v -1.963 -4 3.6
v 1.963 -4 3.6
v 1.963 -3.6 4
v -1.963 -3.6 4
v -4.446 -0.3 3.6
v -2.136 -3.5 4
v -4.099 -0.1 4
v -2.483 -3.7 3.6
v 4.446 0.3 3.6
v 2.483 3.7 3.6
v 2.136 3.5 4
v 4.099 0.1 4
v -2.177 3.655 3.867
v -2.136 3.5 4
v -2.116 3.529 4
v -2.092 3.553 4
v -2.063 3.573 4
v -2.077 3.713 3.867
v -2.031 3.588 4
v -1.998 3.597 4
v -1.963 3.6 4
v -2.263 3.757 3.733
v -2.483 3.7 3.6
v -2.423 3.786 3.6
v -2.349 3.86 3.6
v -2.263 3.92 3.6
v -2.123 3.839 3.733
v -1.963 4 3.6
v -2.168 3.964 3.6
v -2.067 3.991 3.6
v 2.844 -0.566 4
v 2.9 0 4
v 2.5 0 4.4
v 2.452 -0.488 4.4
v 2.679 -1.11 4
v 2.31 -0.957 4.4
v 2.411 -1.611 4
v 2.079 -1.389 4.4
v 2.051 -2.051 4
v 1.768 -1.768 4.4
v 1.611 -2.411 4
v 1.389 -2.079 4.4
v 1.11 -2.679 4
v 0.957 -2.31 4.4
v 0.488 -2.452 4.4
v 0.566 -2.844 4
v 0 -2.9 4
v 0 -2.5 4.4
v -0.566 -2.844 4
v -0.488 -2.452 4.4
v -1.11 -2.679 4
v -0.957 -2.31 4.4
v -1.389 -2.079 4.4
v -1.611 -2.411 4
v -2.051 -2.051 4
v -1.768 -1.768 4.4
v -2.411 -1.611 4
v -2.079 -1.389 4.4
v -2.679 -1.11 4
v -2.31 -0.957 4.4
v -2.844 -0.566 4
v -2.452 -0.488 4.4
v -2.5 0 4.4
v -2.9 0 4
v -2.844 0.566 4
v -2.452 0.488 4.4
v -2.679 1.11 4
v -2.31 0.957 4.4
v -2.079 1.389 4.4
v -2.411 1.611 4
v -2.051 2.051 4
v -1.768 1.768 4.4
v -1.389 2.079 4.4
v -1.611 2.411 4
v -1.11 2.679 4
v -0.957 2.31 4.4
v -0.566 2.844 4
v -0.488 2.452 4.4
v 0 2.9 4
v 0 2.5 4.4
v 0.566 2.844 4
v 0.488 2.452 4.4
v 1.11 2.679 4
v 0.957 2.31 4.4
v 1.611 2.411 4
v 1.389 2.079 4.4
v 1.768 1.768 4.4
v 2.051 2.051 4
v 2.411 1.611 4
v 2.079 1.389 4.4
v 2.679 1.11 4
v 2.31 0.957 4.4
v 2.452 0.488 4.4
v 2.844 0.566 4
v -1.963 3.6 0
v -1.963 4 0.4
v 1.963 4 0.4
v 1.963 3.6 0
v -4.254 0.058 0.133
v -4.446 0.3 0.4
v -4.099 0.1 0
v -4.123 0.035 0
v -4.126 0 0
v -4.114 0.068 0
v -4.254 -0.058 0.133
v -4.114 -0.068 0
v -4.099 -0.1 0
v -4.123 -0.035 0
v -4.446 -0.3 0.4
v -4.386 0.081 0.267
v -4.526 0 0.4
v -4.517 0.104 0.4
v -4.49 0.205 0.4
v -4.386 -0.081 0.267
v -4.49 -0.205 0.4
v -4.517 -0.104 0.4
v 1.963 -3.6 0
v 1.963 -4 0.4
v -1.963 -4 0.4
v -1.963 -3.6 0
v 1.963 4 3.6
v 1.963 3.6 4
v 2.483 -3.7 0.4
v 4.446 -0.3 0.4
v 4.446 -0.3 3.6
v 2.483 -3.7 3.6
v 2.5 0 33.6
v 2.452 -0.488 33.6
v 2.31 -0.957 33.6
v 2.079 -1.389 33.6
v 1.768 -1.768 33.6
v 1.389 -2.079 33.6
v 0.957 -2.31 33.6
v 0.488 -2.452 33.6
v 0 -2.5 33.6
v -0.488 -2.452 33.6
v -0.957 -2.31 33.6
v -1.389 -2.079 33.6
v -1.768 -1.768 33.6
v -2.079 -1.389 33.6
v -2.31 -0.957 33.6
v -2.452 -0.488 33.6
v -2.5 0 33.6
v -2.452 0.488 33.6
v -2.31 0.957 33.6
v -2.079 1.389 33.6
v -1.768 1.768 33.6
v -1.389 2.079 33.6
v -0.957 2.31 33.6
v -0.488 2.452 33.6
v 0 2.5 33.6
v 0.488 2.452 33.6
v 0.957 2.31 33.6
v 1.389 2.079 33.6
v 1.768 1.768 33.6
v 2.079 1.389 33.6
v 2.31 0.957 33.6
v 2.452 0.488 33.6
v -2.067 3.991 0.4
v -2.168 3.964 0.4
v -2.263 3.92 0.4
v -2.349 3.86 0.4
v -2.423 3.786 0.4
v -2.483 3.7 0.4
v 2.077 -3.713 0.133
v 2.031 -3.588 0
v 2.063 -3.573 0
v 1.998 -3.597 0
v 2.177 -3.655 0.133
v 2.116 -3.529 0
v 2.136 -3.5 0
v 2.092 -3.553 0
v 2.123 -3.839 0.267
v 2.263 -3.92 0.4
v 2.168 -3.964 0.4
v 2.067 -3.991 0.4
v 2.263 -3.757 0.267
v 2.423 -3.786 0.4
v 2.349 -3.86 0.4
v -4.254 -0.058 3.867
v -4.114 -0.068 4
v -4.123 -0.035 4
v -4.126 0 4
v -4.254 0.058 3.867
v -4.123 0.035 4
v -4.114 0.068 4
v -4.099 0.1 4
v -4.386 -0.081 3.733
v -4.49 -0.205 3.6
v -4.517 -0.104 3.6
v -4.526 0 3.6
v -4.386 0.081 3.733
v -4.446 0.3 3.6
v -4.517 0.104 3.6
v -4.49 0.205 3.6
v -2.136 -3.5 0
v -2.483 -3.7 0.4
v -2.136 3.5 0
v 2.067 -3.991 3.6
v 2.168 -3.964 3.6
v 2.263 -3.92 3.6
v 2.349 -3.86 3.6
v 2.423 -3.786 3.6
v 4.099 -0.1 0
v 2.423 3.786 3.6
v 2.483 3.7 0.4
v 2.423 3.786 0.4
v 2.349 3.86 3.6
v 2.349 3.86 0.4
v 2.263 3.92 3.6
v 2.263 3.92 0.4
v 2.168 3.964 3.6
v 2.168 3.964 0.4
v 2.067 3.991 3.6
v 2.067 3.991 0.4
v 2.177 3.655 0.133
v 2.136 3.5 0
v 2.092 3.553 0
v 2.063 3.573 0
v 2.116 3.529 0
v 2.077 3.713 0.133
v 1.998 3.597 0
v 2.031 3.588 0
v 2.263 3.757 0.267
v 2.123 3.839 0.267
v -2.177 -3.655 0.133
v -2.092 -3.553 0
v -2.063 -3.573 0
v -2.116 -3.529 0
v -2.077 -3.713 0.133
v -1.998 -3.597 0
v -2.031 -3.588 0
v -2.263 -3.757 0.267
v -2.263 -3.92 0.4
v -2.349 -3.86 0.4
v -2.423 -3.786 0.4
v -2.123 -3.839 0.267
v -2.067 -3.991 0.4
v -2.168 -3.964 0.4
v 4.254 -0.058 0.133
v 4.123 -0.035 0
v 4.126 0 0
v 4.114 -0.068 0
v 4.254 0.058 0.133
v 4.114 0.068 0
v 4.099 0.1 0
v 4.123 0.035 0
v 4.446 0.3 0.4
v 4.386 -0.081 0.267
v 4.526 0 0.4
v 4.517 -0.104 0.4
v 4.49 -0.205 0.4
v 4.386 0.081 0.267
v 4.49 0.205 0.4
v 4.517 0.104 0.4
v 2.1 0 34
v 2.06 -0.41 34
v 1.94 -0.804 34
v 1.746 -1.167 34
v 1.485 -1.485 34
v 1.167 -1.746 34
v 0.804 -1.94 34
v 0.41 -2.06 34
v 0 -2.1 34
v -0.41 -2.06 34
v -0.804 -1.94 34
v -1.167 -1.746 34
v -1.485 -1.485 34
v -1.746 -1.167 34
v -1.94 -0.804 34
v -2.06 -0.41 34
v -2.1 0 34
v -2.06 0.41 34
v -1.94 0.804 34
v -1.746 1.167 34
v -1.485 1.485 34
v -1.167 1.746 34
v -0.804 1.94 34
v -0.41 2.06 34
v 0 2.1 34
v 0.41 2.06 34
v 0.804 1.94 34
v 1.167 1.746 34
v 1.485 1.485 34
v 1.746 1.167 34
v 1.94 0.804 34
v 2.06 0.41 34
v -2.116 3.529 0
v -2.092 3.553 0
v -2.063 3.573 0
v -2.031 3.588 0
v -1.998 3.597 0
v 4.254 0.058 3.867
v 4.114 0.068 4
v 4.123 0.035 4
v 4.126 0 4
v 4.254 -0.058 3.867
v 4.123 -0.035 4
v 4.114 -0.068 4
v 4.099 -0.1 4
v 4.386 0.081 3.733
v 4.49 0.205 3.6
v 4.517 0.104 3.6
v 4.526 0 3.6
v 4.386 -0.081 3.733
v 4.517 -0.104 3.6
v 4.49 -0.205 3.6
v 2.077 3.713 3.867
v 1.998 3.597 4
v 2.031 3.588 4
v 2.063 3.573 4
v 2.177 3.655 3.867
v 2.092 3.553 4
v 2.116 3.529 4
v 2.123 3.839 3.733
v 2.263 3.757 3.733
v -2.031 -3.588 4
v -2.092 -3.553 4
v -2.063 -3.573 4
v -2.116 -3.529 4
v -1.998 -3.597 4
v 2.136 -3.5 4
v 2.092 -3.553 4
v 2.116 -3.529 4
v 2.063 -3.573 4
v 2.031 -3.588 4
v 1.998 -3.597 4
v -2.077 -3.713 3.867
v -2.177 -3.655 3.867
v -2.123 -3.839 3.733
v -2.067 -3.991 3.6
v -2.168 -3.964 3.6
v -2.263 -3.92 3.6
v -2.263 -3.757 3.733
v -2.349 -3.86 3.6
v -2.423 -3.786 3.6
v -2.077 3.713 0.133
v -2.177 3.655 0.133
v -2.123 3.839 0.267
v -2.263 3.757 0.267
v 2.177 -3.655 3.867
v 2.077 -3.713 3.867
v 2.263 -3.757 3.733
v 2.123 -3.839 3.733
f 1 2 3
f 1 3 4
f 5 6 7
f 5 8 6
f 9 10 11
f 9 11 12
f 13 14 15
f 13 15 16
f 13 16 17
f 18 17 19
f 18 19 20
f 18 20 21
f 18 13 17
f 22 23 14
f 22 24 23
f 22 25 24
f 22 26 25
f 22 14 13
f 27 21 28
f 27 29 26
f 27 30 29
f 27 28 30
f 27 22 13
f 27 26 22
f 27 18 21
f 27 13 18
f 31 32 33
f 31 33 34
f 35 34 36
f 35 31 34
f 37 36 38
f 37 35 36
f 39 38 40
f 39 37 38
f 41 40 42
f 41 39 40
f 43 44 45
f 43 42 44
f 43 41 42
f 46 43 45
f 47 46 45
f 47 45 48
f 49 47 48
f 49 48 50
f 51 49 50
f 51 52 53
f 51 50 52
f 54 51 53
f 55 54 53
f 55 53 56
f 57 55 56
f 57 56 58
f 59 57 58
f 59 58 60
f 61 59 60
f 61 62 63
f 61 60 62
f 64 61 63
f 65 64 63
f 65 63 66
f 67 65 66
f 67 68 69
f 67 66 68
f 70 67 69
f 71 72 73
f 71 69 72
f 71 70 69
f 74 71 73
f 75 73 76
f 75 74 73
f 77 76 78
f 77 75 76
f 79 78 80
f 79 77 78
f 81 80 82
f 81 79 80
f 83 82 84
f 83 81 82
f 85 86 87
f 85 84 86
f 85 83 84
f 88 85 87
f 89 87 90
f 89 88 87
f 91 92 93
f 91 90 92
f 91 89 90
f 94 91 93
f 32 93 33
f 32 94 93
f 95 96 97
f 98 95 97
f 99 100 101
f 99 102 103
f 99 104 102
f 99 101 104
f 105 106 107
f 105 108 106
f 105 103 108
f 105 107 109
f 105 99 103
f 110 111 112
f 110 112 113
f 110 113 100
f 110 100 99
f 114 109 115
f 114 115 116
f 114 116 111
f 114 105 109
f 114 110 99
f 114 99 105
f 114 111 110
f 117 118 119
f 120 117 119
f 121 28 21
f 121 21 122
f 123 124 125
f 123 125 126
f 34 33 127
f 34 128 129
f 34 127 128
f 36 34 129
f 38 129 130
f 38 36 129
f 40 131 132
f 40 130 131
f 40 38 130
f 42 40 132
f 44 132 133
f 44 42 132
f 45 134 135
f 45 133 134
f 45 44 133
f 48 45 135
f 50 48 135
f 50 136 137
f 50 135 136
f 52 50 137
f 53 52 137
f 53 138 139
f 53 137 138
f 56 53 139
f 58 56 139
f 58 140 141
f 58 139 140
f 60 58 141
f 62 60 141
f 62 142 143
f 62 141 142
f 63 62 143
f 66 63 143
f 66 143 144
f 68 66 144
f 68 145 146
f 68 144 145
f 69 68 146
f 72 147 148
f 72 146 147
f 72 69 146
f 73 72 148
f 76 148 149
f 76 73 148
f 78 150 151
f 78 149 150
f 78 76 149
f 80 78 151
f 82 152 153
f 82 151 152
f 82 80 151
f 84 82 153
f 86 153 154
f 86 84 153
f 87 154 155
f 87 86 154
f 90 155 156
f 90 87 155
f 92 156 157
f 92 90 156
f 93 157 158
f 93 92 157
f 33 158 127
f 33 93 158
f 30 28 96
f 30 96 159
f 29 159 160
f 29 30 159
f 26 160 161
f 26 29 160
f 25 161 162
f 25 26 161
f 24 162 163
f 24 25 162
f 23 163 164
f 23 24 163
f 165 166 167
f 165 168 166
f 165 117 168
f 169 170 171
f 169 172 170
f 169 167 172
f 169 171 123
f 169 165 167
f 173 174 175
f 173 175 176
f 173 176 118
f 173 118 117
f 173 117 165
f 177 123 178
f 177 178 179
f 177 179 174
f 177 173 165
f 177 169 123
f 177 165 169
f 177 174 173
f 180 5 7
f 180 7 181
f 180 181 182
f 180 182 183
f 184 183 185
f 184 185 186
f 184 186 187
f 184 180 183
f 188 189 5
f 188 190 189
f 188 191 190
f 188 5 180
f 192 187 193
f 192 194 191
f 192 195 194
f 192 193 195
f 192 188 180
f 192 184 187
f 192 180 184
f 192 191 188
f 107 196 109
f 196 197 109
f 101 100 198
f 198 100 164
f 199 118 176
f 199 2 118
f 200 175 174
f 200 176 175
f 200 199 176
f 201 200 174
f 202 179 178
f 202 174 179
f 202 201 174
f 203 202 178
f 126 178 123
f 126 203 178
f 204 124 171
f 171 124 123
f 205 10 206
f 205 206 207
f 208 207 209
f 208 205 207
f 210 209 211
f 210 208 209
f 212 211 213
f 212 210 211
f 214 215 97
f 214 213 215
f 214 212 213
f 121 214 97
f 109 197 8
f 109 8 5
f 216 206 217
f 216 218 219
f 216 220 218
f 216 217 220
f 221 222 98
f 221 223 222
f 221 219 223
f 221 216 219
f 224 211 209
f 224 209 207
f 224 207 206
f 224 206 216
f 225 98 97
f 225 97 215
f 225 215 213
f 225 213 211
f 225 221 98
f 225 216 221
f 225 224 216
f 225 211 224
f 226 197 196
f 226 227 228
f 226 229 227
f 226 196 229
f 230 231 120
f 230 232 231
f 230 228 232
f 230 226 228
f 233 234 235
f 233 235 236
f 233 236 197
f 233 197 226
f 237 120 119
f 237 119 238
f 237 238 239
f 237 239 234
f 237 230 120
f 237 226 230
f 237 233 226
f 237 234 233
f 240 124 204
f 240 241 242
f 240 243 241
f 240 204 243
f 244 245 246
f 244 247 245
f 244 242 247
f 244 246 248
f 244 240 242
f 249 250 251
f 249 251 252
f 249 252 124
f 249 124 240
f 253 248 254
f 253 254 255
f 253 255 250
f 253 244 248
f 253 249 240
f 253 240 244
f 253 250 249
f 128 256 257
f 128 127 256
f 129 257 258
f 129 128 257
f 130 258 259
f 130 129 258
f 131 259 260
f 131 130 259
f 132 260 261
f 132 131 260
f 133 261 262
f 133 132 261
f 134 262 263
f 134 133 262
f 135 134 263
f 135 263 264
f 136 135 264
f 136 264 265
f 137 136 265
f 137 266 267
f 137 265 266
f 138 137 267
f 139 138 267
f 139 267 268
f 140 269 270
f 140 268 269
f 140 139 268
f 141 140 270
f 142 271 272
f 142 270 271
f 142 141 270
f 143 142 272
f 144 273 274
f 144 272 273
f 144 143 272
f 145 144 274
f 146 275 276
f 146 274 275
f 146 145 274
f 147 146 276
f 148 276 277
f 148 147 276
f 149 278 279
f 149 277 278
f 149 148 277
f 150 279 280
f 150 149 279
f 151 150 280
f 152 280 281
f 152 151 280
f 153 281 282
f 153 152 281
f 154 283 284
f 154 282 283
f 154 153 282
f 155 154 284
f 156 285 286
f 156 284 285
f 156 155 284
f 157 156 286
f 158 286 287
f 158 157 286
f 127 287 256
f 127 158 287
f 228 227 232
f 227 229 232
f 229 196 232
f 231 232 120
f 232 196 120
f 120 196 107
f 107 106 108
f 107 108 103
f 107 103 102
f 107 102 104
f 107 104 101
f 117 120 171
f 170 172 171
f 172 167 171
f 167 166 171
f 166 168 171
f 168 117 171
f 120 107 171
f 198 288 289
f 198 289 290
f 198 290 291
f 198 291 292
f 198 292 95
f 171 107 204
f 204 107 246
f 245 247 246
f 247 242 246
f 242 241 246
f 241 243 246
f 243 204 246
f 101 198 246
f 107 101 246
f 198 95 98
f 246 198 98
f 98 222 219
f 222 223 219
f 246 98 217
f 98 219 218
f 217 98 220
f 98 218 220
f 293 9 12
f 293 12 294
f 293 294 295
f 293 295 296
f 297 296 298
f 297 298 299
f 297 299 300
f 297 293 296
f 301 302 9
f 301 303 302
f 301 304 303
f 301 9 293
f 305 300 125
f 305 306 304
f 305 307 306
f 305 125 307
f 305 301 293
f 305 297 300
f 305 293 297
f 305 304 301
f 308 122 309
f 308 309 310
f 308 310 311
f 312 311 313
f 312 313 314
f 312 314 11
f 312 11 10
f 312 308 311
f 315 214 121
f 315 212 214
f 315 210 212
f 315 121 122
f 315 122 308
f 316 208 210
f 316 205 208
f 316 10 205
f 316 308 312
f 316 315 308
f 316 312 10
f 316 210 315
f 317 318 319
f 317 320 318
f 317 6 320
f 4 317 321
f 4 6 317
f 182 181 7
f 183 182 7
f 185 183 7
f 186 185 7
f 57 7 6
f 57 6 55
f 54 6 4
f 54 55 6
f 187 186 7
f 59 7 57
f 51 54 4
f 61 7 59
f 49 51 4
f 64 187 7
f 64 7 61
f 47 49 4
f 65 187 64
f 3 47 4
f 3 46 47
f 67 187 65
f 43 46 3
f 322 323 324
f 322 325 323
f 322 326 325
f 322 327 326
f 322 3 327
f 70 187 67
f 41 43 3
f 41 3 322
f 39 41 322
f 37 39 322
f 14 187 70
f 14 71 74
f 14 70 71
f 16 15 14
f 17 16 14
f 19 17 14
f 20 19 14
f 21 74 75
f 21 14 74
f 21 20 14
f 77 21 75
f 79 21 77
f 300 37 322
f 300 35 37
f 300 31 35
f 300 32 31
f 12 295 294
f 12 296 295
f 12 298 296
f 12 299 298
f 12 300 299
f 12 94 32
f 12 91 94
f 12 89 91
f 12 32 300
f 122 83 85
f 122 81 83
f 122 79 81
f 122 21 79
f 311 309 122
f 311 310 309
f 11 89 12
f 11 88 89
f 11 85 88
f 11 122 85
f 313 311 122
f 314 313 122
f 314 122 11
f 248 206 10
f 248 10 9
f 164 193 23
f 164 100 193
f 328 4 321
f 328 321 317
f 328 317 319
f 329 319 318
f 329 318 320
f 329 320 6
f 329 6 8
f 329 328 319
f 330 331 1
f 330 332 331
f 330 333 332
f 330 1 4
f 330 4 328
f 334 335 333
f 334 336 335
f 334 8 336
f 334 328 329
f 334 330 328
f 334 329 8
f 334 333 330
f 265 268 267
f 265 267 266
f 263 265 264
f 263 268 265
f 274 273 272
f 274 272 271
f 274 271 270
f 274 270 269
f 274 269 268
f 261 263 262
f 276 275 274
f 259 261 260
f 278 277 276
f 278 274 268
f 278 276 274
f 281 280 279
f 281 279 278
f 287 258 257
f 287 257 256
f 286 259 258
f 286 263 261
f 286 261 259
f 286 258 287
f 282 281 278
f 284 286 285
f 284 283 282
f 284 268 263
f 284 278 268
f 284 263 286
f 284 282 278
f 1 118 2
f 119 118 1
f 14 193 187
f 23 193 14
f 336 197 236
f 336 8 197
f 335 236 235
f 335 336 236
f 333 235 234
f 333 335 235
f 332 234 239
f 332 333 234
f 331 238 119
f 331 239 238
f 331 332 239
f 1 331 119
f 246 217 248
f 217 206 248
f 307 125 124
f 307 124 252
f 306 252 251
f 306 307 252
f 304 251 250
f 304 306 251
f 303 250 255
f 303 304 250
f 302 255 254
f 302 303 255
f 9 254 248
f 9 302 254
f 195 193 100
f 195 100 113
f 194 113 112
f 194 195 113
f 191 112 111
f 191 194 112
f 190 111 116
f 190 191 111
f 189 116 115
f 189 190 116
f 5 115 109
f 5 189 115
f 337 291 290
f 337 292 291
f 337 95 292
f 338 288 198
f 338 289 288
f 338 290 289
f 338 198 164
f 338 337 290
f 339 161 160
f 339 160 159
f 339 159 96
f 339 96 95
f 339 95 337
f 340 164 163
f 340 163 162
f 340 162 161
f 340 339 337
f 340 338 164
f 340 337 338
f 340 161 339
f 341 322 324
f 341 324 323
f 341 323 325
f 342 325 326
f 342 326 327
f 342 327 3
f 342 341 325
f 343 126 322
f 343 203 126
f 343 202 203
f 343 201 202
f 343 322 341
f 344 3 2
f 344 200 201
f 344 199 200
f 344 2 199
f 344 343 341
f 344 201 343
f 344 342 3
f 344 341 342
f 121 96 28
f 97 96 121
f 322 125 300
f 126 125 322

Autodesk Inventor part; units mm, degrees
ref_plane "YZ Plane" through (0, 0, 0) normal (1, 0, 0) x (0, 1, 0)
ref_plane "XZ Plane" through (0, 0, 0) normal (0, 1, 0) x (-1, 0, 0)
ref_plane "XY Plane" through (0, 0, 0) normal (0, 0, 1) x (1, 0, 0)
sketch "Эскиз1" plane through (0, 0, 0) normal (0, 0, 1) x (1, 0, 0)
  line L0 (-2.3094, 4) -> (2.3094, 4)
  line L1 (2.3094, 4) -> (4.6188, 0)
  line L2 (4.6188, 0) -> (2.3094, -4)
  line L3 (2.3094, -4) -> (-2.3094, -4)
  line L4 (-2.3094, -4) -> (-4.6188, 0)
  line L5 (-4.6188, 0) -> (-2.3094, 4)
  point P0 (0, 0)
  point P1 (0, 0)
  dimension "d0" = 8
extrude "Выдавливание1" add sketch "Эскиз1" along normal blind 4
sketch "Эскиз2" plane through (0, 0, 4) normal (0, 0, 1) x (1, 0, 0)
  circle A0 centre (0, 0) radius 2.5
  dimension "d3" = 5
extrude "Выдавливание2" add sketch "Эскиз2" along normal blind 30
fillet "Сопряжение1" radius 0.6 6 edges at (-2.3094, -4, 2) (2.3094, -4, 2) (4.6188, 0, 2) (2.3094, 4, 2) (-2.3094, 4, 2) (-4.6188, 0, 2)
chamfer "Фаска1" distance 0.4 angle 45 26 edges at (3.4641, 2, 4) (2.263, 3.9196, 4) (0, 4, 4) (-2.263, 3.9196, 4) (-3.4641, 2, 4) (-4.526, 0, 4) (-3.4641, -2, 4) (-2.263, -3.9196, 4) (0, -4, 4) (2.263, -3.9196, 4) (3.4641, -2, 4) (4.526, 0, 4) (-3.4641, 2, 0) (-4.526, 0, 0) (-3.4641, -2, 0) (-2.263, -3.9196, 0) (0, -4, 0) (2.263, -3.9196, 0) (3.4641, -2, 0) (4.526, 0, 0) (3.4641, 2, 0) (2.263, 3.9196, 0) (0, 4, 0) (-2.263, 3.9196, 0) (-2.5, 0, 34) (-2.5, 0, 4)
thread "Резьба1" size "M5x0.8" class "6g" standard "ANSI Metric M Profile" full length
properties part number "Болт М5х30"
